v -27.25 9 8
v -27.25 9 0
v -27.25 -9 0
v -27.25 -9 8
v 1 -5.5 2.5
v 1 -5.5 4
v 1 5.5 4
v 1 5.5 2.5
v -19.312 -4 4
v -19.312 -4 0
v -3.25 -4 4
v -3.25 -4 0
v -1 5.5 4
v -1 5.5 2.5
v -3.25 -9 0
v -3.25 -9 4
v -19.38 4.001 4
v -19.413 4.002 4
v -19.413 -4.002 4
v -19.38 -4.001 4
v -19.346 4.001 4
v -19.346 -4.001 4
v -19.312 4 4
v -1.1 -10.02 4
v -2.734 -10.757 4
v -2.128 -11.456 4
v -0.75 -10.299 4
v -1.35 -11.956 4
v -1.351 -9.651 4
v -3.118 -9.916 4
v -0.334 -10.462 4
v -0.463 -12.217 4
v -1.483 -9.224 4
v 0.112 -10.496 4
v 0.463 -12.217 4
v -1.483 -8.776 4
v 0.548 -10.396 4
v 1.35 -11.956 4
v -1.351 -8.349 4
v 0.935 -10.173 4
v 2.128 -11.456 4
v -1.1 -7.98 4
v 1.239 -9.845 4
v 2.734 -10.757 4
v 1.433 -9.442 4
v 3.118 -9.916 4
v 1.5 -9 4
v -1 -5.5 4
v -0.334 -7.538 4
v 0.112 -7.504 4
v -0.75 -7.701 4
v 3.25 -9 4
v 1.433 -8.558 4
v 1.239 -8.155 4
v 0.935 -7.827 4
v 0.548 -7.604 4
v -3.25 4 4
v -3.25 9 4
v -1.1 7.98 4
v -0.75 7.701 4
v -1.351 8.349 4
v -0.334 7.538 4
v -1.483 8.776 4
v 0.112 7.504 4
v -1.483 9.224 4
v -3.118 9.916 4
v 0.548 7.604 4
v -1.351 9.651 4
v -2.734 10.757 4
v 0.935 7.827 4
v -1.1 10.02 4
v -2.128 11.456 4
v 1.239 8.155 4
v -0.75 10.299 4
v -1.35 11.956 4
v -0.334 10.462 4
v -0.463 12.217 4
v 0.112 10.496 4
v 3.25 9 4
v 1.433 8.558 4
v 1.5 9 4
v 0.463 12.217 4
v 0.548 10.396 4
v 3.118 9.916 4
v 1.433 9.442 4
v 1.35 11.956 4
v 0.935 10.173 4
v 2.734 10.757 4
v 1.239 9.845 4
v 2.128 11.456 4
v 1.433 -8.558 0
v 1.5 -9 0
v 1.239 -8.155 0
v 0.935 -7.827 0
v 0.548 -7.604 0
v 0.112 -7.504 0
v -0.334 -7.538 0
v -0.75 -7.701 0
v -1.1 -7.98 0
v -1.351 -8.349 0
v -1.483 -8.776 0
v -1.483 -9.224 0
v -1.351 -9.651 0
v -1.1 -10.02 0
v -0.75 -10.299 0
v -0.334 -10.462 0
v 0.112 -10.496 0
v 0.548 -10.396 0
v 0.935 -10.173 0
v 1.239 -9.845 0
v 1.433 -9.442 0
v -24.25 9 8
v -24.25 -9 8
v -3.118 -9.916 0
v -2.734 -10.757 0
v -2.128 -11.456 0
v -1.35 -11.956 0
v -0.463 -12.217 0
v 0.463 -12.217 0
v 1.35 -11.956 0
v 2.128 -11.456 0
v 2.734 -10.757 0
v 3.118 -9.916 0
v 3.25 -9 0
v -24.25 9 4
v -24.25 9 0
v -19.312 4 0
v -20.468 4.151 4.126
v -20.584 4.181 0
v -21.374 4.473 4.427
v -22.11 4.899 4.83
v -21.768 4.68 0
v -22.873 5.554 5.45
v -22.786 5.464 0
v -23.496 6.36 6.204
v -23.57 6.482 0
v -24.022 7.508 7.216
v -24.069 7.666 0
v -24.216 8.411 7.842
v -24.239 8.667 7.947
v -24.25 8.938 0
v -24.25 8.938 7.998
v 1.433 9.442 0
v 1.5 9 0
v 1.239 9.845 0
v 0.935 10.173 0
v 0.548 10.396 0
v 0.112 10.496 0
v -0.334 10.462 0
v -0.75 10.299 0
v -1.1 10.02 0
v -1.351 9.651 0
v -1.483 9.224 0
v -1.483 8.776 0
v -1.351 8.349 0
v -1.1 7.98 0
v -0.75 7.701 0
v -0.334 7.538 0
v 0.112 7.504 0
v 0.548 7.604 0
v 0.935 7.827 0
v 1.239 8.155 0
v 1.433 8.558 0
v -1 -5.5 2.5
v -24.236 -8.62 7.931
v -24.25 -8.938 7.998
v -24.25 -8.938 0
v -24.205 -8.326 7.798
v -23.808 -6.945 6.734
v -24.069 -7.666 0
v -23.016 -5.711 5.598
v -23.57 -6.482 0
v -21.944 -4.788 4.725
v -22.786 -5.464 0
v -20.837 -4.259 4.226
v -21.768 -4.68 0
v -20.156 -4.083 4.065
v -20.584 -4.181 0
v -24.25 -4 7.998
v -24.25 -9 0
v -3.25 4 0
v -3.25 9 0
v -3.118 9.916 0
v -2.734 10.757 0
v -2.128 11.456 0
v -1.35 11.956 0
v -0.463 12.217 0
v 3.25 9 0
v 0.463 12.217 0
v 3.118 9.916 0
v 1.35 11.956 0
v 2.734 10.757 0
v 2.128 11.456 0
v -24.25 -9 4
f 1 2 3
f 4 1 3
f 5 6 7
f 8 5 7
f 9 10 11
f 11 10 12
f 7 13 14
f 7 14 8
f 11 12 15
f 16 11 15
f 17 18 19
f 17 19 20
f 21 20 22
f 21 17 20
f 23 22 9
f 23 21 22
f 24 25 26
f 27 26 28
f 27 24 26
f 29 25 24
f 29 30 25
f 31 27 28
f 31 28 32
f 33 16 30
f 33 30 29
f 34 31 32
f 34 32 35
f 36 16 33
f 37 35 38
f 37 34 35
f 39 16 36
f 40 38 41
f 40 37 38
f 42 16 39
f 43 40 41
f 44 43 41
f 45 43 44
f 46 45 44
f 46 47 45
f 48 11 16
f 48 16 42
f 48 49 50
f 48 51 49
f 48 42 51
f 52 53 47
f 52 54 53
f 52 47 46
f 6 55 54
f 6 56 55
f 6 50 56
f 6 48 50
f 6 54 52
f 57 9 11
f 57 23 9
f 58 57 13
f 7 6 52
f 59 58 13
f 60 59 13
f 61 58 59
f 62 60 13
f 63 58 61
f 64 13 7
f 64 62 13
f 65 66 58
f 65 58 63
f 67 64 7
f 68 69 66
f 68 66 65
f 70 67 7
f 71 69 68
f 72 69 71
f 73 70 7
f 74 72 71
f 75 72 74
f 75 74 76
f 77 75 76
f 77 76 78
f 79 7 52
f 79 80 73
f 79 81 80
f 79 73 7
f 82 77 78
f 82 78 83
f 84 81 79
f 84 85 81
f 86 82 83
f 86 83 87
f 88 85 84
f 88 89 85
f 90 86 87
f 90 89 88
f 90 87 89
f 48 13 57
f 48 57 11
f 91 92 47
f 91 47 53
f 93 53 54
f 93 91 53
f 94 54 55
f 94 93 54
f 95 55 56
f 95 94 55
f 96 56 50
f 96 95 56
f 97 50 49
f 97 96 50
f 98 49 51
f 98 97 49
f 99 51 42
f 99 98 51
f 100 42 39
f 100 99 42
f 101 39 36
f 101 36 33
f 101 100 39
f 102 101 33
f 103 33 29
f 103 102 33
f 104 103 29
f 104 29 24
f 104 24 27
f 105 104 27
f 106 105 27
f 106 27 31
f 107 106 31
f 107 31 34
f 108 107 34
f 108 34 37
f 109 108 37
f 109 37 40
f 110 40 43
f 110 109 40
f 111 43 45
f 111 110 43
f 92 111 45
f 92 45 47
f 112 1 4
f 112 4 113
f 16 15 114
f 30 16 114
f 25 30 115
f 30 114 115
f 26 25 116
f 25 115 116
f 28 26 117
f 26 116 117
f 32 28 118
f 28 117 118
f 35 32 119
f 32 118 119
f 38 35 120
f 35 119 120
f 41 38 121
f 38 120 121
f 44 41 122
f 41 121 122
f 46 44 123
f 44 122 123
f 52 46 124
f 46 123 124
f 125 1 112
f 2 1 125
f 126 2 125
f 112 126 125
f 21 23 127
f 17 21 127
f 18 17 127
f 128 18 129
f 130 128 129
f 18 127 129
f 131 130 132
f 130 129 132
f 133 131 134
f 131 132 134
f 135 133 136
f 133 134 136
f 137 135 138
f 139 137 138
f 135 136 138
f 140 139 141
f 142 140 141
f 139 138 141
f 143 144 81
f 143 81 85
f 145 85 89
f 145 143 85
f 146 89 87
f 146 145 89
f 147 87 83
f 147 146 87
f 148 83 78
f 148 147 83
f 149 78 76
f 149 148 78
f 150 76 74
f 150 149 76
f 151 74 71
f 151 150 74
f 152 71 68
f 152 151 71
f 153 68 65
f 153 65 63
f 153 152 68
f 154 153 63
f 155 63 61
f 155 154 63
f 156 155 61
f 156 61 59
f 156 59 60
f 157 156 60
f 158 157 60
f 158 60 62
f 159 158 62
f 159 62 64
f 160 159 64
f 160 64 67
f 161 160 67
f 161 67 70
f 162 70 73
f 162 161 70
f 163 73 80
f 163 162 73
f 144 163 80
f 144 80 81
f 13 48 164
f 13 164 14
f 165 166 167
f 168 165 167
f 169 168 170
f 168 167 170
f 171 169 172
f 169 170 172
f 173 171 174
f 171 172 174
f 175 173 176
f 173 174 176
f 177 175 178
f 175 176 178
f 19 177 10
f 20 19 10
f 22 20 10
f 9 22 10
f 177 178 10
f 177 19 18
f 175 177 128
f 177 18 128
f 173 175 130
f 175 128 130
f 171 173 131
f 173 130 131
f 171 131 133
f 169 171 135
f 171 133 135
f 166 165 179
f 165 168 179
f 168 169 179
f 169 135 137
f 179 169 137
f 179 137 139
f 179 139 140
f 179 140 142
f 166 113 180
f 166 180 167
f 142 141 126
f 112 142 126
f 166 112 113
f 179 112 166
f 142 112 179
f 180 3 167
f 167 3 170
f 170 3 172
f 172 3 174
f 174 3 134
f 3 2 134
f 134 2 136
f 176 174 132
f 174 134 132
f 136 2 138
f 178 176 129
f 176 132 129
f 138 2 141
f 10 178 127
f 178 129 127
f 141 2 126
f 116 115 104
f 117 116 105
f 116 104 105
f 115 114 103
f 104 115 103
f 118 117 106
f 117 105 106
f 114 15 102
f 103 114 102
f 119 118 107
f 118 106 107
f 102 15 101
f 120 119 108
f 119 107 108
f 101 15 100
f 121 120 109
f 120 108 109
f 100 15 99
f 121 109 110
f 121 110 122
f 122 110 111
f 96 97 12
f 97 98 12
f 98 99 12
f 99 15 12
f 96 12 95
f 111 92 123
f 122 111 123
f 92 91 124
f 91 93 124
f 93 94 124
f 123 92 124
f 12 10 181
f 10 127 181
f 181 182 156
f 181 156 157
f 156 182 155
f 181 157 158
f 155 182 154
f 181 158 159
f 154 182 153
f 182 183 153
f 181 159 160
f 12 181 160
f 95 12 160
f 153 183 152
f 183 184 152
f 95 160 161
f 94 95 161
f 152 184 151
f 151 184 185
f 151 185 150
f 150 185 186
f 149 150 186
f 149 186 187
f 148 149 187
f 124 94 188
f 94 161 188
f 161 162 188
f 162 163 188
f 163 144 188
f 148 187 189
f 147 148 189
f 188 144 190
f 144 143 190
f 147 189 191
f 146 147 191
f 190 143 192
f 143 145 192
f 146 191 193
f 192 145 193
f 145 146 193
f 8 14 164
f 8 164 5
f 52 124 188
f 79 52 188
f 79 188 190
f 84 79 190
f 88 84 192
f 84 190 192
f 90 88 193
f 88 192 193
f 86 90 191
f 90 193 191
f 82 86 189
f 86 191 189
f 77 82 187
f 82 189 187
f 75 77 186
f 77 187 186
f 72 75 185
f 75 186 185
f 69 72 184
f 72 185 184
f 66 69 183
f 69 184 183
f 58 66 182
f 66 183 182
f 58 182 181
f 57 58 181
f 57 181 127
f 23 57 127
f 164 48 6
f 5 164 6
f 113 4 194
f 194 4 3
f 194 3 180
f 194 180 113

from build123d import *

# Parameters (mm, degrees)
F0_R         = 1.5
F0_W         = 21
F0_H         = 8
F0_W_2       = 3
F0_H_2       = 5
F1_DEPTH     = 4
F2_W         = 2
F2_H         = 11
F3_DEPTH     = 1.5
F4_DEPTH     = 8
F5_T1_DEPTH  = 4
F5_T3_DEPTH  = 8
F5_T9_DEPTH  = 20.2494197933
F5_T14_DEPTH = 16.5024140205
F5_T22_DEPTH = 20.2494197933
F5_T27_DEPTH = 16.5024140205


# Not quite as in the source:
# - a fillet or chamfer that OpenCascade refuses, or shapes differently, is made with other operations: its cross-section is extruded or revolved along the edge and cut away or added


with BuildPart() as f1:
    # F0 (on Top) → F1 (new body)
    with BuildSketch(Plane.XY):
        with BuildLine():
            ThreePointArc((-3.25, 9), (0, 5.75), (3.25, 9))
            ThreePointArc((3.25, 9), (0, 12.25), (-3.25, 9))
        make_face()
        with Locations((0, 9)):
            Circle(F0_R, mode=Mode.SUBTRACT)
        with BuildLine():
            Line((3.25, -9), (3.25, 9))
            ThreePointArc((3.25, 9), (0, 5.75), (-3.25, 9))
            Line((-3.25, 9), (-3.25, 4))
            Line((-3.25, 4), (-3.25, -4))
            Line((-3.25, -4), (-3.25, -9))
            ThreePointArc((-3.25, -9), (0, -5.75), (3.25, -9))
        make_face()
        with BuildLine():
            ThreePointArc((-3.25, -9), (0, -12.25), (3.25, -9))
            ThreePointArc((3.25, -9), (0, -5.75), (-3.25, -9))
        make_face()
        with Locations((0, -9)):
            Circle(F0_R, mode=Mode.SUBTRACT)
        with Locations((-13.75, 0)):
            Rectangle(F0_W, F0_H)
        with Locations((-25.75, 0)):
            Rectangle(F0_W_2, F0_H)
        with Locations((-25.75, 6.5)):
            Rectangle(F0_W_2, F0_H_2)
        with Locations((-25.75, -6.5)):
            Rectangle(F0_W_2, F0_H_2)
    extrude(amount=F1_DEPTH)

    # F2 (on face) → F3 (cut)
    with BuildSketch(Plane.XY.offset(4)):
        Rectangle(F2_W, F2_H)
    extrude(amount=-F3_DEPTH, mode=Mode.SUBTRACT)

    # F0 (on Top) → F4 (join)
    with BuildSketch(Plane.XY):
        with Locations((-25.75, 6.5)):
            Rectangle(F0_W_2, F0_H_2)
        with Locations((-25.75, 0)):
            Rectangle(F0_W_2, F0_H)
        with Locations((-25.75, -6.5)):
            Rectangle(F0_W_2, F0_H_2)
    extrude(amount=F4_DEPTH)

    # F5: fillet of radius 5 on 3 edges, made by hand

    # F5_s2 → F5_t1 (join)
    with BuildSketch(Plane.XY):
        with BuildLine():
            ThreePointArc((-19.2490344078, 3.9996), (-22.785192534, 5.4641246619), (-24.2504, 8.9999999228))
            Line((-24.2504, 8.9999999228), (-24.7505365592, 8.9999033465))
            ThreePointArc((-24.7505365592, 8.9999033465), (-24.7501365685, 6.4999999614), (-24.7501365685, 4))
            Line((-24.7501365685, 4), (-24.25, 3.4998634315))
            ThreePointArc((-24.25, 3.4998634315), (-21.7495172039, 3.4998634315), (-19.2490344078, 3.4994634315))
            Line((-19.2490344078, 3.4994634315), (-19.2490344078, 3.9996))
        make_face()
        with BuildLine():
            ThreePointArc((-24.2504, -8.9999999228), (-22.785192534, -5.4641246619), (-19.2490344078, -3.9996))
            Line((-19.2490344078, -3.9996), (-19.2490344078, -3.4994634315))
            ThreePointArc((-19.2490344078, -3.4994634315), (-21.7495172039, -3.4998634315), (-24.25, -3.4998634315))
            Line((-24.25, -3.4998634315), (-24.7501365685, -4))
            ThreePointArc((-24.7501365685, -4), (-24.7501365685, -6.4999999614), (-24.7505365592, -8.9999033465))
            Line((-24.7505365592, -8.9999033465), (-24.2504, -8.9999999228))
        make_face()
    extrude(amount=F5_T1_DEPTH)

    # F5_s4 → F5_t3 (join)
    with BuildSketch(Plane.XZ.offset(-4)):
        with BuildLine():
            ThreePointArc((-19.350232099, 3.9996), (-22.5130680788, 5.126675133), (-24.2503919057, 7.9999199382))
            Line((-24.2503919057, 7.9999199382), (-24.7404078864, 7.8998153635))
            ThreePointArc((-24.7404078864, 7.8998153635), (-24.7501365685, 5.9999599691), (-24.7501365685, 4))
            Line((-24.7501365685, 4), (-24.25, 3.4998634315))
            ThreePointArc((-24.25, 3.4998634315), (-21.8001160495, 3.4998634315), (-19.350232099, 3.4994634315))
            Line((-19.350232099, 3.4994634315), (-19.350232099, 3.9996))
        make_face()
    extrude(amount=F5_T3_DEPTH)


with BuildPart() as f5_tool7:
    # F5_s8 → F5_t9 (new body)
    with BuildSketch(Plane.XZ.offset(-16.2494197933)):
        with BuildLine():
            ThreePointArc((-19.350232099, 3.9996), (-22.5130680788, 5.126675133), (-24.2503919057, 7.9999199382))
            Line((-24.2503919057, 7.9999199382), (-24.7404078864, 7.8998153635))
            ThreePointArc((-24.7404078864, 7.8998153635), (-24.7501365685, 5.9999599691), (-24.7501365685, 4))
            Line((-24.7501365685, 4), (-24.25, 3.4998634315))
            ThreePointArc((-24.25, 3.4998634315), (-21.8001160495, 3.4998634315), (-19.350232099, 3.4994634315))
            Line((-19.350232099, 3.4994634315), (-19.350232099, 3.9996))
        make_face()
    extrude(amount=F5_T9_DEPTH)

    split(bisect_by=Plane.XZ.offset(-4), keep=Keep.BOTTOM)

    split(bisect_by=Plane.XZ.offset(-9), keep=Keep.TOP)


with BuildPart() as f5_tool12:
    # F5_s13 → F5_t14 (new body)
    with BuildSketch(Plane.XY):
        with BuildLine():
            ThreePointArc((-19.2490344078, 3.9996), (-22.785192534, 5.4641246619), (-24.2504, 8.9999999228))
            Line((-24.2504, 8.9999999228), (-24.7505365592, 8.9999033465))
            ThreePointArc((-24.7505365592, 8.9999033465), (-24.7501365685, 6.4999999614), (-24.7501365685, 4))
            Line((-24.7501365685, 4), (-24.25, 3.4998634315))
            ThreePointArc((-24.25, 3.4998634315), (-21.7495172039, 3.4998634315), (-19.2490344078, 3.4994634315))
            Line((-19.2490344078, 3.4994634315), (-19.2490344078, 3.9996))
        make_face()
    extrude(amount=F5_T14_DEPTH)

    split(bisect_by=Plane.XY.offset(4), keep=Keep.TOP)

    split(bisect_by=Plane.XY.offset(8), keep=Keep.BOTTOM)


with BuildPart() as f5_tool7_1:
    add(f5_tool7.part)

    # F5_t17: intersect F5_tool12
    add(f5_tool12.part, mode=Mode.INTERSECT)


with BuildPart() as f1_1:
    add(f1.part)

    # F5_t5: union F5_tool7
    add(f5_tool7_1.part)


with BuildPart() as f5_tool20:
    # F5_s21 → F5_t22 (new body)
    with BuildSketch(Plane.XZ.offset(-4)):
        with BuildLine():
            ThreePointArc((-19.350232099, 3.9996), (-22.5130680788, 5.126675133), (-24.2503919057, 7.9999199382))
            Line((-24.2503919057, 7.9999199382), (-24.7404078864, 7.8998153635))
            ThreePointArc((-24.7404078864, 7.8998153635), (-24.7501365685, 5.9999599691), (-24.7501365685, 4))
            Line((-24.7501365685, 4), (-24.25, 3.4998634315))
            ThreePointArc((-24.25, 3.4998634315), (-21.8001160495, 3.4998634315), (-19.350232099, 3.4994634315))
            Line((-19.350232099, 3.4994634315), (-19.350232099, 3.9996))
        make_face()
    extrude(amount=F5_T22_DEPTH)

    split(bisect_by=Plane.XZ.offset(9), keep=Keep.BOTTOM)

    split(bisect_by=Plane.XZ.offset(4), keep=Keep.TOP)


with BuildPart() as f5_tool25:
    # F5_s26 → F5_t27 (new body)
    with BuildSketch(Plane.XY):
        with BuildLine():
            ThreePointArc((-24.2504, -8.9999999228), (-22.785192534, -5.4641246619), (-19.2490344078, -3.9996))
            Line((-19.2490344078, -3.9996), (-19.2490344078, -3.4994634315))
            ThreePointArc((-19.2490344078, -3.4994634315), (-21.7495172039, -3.4998634315), (-24.25, -3.4998634315))
            Line((-24.25, -3.4998634315), (-24.7501365685, -4))
            ThreePointArc((-24.7501365685, -4), (-24.7501365685, -6.4999999614), (-24.7505365592, -8.9999033465))
            Line((-24.7505365592, -8.9999033465), (-24.2504, -8.9999999228))
        make_face()
    extrude(amount=F5_T27_DEPTH)

    split(bisect_by=Plane.XY.offset(4), keep=Keep.TOP)

    split(bisect_by=Plane.XY.offset(8), keep=Keep.BOTTOM)


with BuildPart() as f5_tool20_1:
    add(f5_tool20.part)

    # F5_t30: intersect F5_tool25
    add(f5_tool25.part, mode=Mode.INTERSECT)


with BuildPart() as f1_2:
    add(f1_1.part)

    # F5_t18: union F5_tool20
    add(f5_tool20_1.part)


solid = f1_2.part
